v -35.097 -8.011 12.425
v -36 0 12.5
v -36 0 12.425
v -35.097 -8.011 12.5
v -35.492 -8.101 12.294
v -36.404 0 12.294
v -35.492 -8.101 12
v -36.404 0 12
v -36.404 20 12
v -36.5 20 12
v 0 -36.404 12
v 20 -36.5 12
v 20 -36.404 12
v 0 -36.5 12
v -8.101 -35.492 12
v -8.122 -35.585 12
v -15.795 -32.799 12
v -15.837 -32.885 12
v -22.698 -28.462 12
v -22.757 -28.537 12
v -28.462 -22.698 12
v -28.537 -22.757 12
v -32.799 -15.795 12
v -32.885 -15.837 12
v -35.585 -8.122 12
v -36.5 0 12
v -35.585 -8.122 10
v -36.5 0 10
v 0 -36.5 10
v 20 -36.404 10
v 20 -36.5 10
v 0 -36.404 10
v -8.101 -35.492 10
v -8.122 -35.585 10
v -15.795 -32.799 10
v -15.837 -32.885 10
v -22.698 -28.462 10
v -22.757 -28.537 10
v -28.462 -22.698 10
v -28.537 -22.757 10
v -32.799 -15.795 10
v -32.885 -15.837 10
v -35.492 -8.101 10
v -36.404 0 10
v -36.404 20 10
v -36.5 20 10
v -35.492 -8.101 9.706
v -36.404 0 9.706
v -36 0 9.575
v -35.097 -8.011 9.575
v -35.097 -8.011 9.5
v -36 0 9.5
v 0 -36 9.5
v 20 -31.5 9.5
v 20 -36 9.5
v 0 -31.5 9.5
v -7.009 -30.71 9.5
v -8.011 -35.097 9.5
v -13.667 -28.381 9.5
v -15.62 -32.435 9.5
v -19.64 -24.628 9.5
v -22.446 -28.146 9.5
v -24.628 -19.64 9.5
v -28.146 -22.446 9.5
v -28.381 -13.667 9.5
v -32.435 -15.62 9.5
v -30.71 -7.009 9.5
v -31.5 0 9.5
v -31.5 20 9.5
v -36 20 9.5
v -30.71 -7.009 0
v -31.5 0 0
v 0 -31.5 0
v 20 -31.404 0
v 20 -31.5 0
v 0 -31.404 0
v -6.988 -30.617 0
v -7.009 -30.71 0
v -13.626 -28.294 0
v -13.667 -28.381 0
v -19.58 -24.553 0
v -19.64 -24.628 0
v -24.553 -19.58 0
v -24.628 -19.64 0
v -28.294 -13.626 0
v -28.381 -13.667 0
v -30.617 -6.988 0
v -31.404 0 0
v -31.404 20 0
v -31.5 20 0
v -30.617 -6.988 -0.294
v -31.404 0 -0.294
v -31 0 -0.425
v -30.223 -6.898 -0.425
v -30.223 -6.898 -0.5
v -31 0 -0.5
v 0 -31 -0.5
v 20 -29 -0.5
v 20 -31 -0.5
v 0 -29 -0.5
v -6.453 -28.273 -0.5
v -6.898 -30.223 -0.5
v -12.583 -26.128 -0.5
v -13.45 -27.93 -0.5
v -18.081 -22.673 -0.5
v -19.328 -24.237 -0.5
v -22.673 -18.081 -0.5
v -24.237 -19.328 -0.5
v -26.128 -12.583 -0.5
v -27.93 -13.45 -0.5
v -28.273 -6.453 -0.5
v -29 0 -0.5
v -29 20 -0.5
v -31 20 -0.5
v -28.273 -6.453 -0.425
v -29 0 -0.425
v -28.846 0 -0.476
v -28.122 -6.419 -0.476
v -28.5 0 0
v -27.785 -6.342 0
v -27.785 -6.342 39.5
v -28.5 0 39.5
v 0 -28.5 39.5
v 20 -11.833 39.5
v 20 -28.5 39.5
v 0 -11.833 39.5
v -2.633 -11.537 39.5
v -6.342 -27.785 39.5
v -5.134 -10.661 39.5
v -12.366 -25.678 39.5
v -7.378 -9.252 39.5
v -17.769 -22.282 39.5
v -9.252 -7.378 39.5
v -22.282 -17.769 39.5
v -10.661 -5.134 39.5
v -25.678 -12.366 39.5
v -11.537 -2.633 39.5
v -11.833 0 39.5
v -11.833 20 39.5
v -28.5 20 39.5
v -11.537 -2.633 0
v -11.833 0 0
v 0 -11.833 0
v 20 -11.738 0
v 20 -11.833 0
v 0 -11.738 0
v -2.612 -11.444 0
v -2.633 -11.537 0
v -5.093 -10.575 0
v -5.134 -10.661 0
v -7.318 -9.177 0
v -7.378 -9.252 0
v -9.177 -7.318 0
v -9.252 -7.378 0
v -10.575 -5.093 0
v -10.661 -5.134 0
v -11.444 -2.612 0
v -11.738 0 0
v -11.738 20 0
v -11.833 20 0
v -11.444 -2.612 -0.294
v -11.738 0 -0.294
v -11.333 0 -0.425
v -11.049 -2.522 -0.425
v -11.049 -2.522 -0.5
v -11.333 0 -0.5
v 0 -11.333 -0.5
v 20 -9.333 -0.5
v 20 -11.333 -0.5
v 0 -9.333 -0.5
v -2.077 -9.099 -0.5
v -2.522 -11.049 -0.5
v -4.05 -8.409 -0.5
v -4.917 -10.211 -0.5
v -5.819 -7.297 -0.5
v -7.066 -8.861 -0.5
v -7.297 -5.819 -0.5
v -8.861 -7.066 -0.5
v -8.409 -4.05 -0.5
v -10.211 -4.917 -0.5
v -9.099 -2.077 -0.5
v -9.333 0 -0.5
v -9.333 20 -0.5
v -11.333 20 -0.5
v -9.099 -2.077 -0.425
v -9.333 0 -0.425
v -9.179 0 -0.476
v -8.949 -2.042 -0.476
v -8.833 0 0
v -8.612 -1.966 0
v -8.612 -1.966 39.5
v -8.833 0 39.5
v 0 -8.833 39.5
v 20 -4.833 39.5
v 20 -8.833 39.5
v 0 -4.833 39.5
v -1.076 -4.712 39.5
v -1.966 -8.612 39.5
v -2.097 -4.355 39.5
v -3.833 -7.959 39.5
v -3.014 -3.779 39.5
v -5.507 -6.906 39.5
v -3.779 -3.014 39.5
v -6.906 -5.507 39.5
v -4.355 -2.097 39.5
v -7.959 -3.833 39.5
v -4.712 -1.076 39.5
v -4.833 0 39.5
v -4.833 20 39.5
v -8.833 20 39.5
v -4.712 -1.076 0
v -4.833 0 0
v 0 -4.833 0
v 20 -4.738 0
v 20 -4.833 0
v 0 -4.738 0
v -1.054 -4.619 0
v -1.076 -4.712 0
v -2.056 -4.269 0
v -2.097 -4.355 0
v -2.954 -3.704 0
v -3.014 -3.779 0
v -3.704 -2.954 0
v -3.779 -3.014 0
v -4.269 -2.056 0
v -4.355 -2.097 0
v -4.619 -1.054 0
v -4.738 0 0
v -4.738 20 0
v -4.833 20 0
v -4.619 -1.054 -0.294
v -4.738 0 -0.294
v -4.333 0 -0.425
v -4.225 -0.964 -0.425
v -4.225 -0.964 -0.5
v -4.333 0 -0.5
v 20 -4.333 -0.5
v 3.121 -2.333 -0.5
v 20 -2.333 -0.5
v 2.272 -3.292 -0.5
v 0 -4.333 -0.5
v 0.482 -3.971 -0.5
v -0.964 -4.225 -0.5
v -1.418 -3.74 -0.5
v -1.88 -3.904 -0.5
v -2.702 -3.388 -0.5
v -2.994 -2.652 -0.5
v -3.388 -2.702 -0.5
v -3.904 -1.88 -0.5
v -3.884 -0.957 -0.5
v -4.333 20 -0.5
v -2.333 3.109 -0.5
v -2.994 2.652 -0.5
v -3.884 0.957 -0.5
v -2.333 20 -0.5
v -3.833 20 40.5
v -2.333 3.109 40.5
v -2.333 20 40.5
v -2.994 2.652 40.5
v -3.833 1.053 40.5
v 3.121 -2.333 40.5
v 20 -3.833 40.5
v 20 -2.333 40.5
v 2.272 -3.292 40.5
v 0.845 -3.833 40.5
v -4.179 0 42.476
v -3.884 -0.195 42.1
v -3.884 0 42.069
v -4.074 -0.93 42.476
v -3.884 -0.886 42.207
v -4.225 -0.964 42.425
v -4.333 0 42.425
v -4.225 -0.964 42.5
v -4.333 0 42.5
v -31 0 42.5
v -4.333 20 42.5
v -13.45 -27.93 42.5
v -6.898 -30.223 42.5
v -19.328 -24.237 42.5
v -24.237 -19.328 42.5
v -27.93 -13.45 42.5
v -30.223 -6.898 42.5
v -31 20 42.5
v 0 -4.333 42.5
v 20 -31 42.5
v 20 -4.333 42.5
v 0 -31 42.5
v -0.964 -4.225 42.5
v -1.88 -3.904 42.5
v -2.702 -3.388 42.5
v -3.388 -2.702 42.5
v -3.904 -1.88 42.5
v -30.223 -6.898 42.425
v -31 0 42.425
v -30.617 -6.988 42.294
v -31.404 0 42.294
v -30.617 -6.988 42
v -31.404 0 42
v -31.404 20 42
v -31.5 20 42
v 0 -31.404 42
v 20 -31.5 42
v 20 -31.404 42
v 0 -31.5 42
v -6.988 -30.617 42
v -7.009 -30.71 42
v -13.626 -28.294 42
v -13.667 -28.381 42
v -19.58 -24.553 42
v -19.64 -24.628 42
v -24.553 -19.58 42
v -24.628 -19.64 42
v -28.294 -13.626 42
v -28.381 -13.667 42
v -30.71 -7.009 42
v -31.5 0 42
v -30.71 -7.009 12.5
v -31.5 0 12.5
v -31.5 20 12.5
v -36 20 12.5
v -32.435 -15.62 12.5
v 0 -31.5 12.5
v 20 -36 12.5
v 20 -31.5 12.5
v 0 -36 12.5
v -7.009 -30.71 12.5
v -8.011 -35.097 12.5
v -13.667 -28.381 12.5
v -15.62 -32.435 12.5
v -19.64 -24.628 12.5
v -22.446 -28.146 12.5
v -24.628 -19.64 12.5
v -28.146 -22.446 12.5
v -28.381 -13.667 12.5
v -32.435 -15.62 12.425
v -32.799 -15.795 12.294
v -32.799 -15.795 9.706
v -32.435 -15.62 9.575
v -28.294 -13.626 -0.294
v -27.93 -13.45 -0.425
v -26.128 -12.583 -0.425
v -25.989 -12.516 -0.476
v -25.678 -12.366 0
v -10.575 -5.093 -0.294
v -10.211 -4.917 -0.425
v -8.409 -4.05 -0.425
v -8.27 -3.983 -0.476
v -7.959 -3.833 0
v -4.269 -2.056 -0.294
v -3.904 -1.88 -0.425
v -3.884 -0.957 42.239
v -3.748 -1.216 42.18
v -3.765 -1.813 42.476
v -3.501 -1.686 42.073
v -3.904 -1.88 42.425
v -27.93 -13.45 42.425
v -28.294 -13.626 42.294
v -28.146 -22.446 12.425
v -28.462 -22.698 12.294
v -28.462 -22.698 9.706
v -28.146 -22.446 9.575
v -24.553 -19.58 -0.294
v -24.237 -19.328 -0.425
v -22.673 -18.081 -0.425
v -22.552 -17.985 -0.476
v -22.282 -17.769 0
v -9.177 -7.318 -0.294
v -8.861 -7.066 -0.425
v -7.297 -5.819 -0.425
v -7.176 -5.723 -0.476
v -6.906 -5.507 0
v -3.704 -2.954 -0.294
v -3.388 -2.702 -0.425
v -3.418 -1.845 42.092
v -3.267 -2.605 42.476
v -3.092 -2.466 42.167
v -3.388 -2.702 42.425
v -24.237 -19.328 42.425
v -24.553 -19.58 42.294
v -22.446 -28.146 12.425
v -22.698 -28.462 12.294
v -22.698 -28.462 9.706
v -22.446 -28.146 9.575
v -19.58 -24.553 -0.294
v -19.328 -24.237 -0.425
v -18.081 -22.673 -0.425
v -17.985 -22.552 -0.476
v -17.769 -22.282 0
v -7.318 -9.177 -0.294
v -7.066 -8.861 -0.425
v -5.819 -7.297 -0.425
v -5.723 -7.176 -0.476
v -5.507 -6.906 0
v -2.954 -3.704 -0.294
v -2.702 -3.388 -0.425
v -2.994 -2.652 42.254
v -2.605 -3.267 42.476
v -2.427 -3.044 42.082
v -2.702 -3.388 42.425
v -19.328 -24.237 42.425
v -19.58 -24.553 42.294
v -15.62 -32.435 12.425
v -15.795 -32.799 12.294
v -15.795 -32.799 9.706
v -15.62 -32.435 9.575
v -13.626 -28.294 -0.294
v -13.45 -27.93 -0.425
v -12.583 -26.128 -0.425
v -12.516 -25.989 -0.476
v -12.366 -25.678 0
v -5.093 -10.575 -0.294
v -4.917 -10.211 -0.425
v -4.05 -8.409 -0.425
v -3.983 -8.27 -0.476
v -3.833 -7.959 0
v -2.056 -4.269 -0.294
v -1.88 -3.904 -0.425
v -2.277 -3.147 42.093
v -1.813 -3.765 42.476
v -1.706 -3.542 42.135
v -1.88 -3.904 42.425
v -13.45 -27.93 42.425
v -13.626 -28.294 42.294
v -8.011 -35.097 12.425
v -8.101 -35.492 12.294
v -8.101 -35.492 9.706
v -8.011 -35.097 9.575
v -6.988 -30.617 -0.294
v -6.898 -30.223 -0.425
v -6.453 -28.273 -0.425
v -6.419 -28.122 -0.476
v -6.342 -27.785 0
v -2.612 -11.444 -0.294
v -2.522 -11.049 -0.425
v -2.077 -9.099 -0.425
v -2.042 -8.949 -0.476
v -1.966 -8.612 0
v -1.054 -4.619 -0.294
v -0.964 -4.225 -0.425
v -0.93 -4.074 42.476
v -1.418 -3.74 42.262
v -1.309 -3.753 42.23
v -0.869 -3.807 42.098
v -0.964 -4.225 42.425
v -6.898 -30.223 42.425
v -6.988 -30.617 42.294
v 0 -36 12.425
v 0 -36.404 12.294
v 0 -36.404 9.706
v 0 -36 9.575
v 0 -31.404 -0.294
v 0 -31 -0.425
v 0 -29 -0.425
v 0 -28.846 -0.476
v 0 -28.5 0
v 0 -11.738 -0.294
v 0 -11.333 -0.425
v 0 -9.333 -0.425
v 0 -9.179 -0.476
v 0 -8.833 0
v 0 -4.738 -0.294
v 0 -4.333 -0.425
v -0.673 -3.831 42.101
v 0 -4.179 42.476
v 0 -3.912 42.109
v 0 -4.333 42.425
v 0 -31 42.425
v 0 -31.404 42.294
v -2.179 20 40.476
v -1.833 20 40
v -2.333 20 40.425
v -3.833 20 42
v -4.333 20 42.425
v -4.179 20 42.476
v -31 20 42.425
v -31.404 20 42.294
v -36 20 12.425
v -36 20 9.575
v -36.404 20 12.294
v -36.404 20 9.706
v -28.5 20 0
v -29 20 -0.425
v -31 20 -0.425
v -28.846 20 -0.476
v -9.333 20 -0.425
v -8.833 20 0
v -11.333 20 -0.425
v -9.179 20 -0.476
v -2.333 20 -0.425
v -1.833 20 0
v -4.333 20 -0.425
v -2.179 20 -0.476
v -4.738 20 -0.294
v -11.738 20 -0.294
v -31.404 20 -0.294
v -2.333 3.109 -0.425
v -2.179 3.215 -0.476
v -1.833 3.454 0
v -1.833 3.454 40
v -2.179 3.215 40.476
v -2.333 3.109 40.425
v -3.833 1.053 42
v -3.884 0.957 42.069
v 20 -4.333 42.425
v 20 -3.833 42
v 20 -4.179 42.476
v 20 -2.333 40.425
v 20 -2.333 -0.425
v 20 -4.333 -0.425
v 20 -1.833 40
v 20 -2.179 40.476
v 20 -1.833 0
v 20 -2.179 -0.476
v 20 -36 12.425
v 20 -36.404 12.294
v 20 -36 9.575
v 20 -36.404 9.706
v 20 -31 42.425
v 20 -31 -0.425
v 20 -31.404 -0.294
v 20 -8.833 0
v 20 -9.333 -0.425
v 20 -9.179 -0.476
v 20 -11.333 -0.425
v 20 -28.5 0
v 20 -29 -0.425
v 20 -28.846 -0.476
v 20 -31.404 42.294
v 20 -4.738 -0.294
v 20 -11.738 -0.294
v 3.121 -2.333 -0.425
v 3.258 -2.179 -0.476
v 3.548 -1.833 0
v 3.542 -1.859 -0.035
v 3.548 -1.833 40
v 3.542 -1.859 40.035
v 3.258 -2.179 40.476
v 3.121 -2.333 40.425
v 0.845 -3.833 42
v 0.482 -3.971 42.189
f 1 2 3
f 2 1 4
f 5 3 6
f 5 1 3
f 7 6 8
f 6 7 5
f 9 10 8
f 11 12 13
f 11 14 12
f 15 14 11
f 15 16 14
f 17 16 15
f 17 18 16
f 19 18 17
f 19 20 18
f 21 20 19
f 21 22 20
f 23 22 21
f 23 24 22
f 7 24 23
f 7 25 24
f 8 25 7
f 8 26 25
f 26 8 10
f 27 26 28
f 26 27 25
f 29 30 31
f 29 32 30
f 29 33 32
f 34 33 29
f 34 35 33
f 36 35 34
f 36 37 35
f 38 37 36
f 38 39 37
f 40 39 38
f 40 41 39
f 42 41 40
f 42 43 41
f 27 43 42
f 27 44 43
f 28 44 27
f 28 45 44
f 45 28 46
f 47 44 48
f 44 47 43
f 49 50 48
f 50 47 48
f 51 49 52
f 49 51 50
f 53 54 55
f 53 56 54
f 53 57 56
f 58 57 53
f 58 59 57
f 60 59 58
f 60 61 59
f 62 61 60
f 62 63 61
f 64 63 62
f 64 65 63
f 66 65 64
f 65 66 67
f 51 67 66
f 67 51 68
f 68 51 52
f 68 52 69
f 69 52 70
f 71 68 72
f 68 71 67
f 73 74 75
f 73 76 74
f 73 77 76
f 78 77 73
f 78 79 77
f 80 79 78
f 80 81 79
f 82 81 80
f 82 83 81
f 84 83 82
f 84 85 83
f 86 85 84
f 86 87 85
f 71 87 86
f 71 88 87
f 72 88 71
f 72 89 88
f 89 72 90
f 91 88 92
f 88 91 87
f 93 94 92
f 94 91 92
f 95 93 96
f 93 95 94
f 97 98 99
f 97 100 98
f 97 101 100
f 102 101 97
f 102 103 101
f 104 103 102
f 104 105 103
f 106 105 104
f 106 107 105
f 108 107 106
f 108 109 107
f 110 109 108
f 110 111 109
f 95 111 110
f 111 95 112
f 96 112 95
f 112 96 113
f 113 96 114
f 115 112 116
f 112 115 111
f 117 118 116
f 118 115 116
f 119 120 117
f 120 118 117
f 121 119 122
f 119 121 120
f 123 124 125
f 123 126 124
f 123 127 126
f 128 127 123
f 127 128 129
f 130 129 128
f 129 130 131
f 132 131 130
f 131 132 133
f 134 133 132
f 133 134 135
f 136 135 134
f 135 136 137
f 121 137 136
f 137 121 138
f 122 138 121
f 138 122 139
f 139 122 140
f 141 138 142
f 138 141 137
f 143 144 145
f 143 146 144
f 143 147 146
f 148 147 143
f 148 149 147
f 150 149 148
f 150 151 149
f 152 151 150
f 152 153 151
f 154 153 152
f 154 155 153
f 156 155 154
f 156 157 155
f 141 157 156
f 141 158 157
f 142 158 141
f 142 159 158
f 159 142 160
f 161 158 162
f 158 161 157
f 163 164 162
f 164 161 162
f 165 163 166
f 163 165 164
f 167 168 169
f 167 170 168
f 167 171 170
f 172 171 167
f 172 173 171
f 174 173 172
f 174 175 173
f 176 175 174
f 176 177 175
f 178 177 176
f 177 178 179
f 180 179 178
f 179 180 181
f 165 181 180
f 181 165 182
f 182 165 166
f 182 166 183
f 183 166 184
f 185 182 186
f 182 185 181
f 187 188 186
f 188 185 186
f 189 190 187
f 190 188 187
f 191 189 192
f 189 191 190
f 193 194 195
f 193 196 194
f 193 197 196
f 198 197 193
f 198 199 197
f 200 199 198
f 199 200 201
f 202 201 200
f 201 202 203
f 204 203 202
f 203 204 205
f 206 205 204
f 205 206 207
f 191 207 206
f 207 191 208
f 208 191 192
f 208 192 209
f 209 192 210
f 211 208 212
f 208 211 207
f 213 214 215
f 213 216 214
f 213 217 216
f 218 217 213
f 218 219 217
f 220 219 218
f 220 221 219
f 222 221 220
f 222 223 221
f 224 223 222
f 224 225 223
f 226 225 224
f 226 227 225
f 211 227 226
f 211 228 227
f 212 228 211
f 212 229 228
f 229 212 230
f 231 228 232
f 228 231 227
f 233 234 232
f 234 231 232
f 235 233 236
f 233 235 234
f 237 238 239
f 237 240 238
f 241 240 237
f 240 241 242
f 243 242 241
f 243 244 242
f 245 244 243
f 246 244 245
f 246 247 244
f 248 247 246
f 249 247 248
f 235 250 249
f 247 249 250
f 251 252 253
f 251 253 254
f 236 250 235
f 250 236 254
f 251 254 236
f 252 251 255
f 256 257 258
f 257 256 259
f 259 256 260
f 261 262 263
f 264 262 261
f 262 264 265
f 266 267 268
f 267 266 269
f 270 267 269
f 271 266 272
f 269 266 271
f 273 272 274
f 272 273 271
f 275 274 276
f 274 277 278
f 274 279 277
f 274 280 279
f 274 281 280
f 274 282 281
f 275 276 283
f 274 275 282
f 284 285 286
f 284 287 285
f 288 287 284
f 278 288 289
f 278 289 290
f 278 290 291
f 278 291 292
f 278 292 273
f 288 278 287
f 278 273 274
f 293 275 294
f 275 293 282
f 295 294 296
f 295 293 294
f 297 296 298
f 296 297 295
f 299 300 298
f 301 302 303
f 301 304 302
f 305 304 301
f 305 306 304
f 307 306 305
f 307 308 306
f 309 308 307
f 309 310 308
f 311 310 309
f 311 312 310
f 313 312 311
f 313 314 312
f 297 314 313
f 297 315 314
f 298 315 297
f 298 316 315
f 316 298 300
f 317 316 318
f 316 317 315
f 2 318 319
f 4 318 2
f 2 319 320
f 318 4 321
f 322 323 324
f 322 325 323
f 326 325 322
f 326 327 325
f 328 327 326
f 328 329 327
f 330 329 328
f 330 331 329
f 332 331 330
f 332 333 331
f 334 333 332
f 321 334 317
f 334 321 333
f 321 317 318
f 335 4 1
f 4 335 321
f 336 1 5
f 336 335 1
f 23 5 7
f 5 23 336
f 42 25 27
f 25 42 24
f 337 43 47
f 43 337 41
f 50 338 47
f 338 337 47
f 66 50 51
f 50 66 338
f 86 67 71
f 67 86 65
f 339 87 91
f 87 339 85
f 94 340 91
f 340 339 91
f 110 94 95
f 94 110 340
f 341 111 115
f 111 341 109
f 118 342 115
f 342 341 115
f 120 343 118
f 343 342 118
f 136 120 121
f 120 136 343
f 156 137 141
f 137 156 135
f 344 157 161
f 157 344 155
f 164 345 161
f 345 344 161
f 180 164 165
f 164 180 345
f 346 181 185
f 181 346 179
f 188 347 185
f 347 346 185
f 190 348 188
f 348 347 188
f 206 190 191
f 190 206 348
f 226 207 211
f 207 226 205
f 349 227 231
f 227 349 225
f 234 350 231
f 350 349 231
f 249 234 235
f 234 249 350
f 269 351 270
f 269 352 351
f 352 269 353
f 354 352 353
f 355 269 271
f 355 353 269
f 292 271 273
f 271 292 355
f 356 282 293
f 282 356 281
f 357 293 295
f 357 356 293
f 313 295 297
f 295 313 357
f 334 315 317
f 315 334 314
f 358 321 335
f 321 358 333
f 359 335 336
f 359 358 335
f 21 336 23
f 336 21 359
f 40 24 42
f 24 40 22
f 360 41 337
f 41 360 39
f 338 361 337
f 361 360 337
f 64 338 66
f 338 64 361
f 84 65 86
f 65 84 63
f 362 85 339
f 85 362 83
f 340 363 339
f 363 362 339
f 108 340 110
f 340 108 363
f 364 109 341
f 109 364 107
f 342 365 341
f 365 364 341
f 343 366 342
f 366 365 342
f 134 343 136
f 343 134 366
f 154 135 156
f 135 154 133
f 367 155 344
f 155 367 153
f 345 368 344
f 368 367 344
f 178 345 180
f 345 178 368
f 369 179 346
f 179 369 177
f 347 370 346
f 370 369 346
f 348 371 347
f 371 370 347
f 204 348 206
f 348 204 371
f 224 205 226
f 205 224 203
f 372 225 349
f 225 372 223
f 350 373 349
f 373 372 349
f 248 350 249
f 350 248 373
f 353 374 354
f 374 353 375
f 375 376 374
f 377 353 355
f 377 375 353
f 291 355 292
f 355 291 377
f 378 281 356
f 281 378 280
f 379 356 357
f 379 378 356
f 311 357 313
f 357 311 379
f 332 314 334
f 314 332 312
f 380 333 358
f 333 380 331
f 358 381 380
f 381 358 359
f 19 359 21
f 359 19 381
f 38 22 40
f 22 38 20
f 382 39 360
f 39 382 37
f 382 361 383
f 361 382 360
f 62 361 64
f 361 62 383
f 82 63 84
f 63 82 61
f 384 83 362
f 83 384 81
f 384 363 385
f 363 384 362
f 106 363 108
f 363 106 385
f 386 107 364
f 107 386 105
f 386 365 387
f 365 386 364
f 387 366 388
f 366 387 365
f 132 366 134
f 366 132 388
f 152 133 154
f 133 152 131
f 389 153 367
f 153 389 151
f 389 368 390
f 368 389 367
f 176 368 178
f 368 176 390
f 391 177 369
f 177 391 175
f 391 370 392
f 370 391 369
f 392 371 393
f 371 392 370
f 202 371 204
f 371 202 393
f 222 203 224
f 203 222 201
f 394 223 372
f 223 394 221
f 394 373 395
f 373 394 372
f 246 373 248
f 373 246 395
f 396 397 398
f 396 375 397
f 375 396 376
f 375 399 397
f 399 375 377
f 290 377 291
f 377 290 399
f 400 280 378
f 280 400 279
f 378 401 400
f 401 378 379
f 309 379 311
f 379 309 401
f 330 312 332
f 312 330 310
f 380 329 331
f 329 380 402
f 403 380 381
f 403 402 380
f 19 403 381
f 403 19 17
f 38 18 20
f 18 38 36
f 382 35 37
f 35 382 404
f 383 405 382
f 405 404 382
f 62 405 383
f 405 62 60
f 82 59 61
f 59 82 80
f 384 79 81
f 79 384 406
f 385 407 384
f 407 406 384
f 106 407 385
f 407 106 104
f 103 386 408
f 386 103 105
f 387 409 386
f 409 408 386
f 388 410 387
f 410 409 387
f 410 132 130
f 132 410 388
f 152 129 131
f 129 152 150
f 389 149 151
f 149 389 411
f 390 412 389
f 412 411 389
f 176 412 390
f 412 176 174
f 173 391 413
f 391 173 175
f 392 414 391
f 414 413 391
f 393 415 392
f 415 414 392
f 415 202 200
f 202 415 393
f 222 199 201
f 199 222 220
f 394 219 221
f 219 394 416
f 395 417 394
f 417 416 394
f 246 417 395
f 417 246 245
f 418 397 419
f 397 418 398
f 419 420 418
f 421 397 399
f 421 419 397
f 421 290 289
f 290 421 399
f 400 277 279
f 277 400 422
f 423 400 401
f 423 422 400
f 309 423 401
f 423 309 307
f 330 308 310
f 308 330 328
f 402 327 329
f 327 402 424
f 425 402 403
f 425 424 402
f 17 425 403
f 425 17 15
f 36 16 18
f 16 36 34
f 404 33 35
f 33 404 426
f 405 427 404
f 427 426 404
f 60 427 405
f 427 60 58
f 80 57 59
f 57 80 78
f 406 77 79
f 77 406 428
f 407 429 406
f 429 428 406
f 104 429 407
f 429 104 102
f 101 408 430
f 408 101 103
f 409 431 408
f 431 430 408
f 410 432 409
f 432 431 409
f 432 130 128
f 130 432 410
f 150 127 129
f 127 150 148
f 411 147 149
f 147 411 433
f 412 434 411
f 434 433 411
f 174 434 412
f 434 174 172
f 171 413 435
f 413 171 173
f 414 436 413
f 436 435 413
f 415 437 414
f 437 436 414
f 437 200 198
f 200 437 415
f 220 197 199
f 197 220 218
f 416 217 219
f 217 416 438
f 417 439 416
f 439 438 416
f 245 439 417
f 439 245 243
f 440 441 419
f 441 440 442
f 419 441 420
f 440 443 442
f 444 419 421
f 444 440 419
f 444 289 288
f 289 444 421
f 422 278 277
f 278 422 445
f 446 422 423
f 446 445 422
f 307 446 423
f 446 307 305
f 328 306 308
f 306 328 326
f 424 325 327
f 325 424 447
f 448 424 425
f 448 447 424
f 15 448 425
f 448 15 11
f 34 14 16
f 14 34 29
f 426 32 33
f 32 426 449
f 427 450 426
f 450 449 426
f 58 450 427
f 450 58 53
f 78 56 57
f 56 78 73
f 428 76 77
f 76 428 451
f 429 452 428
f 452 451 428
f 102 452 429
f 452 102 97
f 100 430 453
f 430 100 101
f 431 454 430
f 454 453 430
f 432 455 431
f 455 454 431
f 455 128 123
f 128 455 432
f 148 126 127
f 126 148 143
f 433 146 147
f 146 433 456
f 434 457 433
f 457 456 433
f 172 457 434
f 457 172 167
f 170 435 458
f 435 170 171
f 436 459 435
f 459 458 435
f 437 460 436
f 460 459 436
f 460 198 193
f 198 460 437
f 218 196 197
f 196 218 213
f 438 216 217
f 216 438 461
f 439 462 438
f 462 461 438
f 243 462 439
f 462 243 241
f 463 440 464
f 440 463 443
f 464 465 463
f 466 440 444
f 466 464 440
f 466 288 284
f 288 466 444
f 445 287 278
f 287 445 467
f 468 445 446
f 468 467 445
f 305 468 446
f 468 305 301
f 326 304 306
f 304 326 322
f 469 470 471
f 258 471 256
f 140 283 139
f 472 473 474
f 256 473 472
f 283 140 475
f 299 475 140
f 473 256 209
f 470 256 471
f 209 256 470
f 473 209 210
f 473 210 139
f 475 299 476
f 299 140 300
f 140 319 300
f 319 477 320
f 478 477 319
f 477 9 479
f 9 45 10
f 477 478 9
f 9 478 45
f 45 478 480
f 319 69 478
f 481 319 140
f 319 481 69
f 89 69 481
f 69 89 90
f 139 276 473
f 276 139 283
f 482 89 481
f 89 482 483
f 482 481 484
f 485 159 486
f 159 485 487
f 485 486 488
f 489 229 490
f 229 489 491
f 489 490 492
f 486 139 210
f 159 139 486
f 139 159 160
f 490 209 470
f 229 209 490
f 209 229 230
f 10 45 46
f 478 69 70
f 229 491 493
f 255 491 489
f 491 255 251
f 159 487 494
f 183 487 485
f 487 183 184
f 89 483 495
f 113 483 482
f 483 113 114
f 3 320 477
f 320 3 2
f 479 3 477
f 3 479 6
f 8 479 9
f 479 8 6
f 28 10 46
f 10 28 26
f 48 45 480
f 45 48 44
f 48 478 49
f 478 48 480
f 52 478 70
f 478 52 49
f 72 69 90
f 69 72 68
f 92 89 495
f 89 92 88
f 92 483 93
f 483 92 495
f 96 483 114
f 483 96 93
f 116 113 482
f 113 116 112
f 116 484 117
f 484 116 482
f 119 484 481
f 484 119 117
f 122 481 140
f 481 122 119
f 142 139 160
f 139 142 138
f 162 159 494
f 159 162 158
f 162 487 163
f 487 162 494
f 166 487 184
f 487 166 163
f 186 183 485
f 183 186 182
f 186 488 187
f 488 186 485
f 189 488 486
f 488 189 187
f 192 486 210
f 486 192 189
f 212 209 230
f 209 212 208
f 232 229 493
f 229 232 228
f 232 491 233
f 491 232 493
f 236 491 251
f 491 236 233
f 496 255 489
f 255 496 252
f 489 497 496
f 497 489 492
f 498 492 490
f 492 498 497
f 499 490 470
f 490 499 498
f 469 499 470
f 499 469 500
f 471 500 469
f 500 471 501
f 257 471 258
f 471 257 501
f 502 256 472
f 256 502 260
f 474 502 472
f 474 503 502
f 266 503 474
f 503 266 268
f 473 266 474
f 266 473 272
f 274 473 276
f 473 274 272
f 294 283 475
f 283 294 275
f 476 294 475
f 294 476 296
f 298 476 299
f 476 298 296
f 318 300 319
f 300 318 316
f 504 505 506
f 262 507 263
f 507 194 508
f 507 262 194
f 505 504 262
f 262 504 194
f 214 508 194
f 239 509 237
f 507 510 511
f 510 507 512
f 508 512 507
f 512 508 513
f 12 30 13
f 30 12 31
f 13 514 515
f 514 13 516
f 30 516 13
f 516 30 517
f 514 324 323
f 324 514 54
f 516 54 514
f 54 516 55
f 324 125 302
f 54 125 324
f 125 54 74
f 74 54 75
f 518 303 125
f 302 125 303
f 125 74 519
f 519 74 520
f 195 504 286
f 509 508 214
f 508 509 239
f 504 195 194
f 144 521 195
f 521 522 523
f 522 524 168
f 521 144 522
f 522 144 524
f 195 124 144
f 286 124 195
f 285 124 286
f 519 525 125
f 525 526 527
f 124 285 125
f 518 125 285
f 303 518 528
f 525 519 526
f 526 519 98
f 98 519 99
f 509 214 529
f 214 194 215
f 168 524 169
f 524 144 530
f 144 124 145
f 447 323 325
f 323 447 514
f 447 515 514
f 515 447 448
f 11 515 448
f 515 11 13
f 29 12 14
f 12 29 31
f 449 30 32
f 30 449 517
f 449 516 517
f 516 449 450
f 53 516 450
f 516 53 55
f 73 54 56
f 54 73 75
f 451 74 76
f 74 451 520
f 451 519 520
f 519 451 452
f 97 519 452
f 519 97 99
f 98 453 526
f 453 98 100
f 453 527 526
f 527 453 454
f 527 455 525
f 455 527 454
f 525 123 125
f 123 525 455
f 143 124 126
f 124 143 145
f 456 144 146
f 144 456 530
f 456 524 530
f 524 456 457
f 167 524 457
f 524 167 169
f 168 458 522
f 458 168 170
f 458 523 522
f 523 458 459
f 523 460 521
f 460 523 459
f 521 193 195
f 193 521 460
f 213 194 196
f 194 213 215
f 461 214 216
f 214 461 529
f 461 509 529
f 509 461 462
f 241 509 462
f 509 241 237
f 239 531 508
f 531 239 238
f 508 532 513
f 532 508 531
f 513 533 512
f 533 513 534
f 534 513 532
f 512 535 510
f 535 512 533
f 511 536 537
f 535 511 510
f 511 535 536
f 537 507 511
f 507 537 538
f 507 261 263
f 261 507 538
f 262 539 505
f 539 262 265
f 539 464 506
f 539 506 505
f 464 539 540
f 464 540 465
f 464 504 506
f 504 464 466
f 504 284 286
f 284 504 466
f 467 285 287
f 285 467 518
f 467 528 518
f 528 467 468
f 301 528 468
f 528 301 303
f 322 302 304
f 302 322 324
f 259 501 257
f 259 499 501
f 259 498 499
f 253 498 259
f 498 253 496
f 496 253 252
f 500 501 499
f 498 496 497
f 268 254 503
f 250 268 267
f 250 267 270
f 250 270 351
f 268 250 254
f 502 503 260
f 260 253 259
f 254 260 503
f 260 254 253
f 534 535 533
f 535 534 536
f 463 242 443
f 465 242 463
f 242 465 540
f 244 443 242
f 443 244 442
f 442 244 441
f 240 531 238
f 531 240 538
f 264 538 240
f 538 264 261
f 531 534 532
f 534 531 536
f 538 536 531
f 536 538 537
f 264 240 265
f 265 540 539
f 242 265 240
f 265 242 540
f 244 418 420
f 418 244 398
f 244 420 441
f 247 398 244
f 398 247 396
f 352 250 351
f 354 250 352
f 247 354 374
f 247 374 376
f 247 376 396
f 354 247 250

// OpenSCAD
use <lib/shortcuts.scad>

b=80/2;
h=20;
d=2;
rr=1;
brett=5;
gurt=20/2;

//Tx(-b/2) Ty(-b/2) Tz(h/2) Ry(90) Cu(h,b,d);

//Tz(-b/2) Rx(90) Cu(b,b,d);
//Ty(-b/2) Cu(b,b,d);


D() {
	U() {
rotate_extrude(angle=90) Tx(-h-5-3*d)schnitt();
Ty(20) Rx(90) linear_extrude(20) Tx(-h-5-3*d)schnitt();
Ty() Rz(90) Rx(90) linear_extrude(20) Tx(-h-5-3*d)schnitt();
	}
#Tz(20) Tx() Ty() Cy(h=50, r=4);
}
module schnitt() 
{
rounded_rect(b,d);
Tx(4*h/3) rounded_rect(b,d);
Tx(4*h/3-(brett+d)) rounded_rect(b,d);
Ty(b) rounded_rect(d,4*h/3);
Tx(-5) Ty(gurt) rounded_rect(d,5);
}

module rounded_rect(h,b,rr=0.5)
{
		Ci(r = rr) ;
		Ty(h) Ci(r=rr);
		Tx(b) Ci(r=rr);
		Tx(b) Ty(h) Ci(r=rr);
		Tx(b/2) Ty(h/2) square([b,2*rr+h], center=true);
		Tx(b/2) Ty(h/2) square([b+2*rr,h], center=true);
}
